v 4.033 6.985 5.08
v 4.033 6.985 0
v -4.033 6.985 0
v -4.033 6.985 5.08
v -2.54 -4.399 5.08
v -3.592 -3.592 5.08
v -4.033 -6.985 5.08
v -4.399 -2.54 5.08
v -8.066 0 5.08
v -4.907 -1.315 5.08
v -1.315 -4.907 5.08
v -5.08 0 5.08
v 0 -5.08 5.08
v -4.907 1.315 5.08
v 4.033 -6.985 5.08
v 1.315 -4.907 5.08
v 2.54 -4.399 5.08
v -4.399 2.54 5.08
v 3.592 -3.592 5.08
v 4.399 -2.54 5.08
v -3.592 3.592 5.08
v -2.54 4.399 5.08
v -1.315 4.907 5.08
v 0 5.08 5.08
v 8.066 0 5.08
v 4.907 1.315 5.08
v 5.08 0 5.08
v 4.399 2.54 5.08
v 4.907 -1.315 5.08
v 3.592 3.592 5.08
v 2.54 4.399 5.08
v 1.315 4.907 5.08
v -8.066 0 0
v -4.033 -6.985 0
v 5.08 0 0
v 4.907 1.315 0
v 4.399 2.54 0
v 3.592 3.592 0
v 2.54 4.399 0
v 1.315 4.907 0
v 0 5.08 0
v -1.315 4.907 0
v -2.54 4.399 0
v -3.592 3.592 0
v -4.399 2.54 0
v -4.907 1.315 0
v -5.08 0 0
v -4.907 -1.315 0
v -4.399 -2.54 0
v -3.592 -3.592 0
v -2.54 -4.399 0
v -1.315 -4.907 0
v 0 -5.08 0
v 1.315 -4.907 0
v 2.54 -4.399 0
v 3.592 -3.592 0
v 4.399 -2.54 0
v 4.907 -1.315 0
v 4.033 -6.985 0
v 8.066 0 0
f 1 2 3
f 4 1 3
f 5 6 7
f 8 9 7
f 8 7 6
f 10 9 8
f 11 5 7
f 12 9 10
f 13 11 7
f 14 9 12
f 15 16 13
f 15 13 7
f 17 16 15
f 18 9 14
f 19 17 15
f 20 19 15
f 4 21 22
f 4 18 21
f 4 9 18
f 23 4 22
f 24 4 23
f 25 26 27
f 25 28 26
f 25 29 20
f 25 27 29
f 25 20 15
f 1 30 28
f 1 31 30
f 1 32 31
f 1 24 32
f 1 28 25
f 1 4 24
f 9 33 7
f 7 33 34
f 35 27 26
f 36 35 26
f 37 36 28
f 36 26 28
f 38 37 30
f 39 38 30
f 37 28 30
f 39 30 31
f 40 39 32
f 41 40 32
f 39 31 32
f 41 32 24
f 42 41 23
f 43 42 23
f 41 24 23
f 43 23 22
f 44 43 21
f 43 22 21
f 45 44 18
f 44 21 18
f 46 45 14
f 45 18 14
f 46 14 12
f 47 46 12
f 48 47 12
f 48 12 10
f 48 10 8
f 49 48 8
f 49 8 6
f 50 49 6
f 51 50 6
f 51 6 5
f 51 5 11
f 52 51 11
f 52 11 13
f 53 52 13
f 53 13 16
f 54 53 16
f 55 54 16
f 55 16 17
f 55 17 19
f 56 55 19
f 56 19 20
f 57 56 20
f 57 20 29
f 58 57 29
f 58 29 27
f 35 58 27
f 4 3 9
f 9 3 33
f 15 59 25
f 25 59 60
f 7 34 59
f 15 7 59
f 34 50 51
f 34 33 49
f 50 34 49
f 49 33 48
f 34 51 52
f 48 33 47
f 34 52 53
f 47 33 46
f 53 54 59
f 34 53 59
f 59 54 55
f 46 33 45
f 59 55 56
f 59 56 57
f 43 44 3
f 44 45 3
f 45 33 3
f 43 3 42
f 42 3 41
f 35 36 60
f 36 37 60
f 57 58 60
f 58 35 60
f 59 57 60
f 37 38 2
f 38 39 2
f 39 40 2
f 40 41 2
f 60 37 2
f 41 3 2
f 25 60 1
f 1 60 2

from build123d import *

# Parameters (mm, degrees)
BOSS_EXTRUDE1_DEPTH = 5.08
CUT_EXTRUDE1_REACH  = 13.817
SKETCH2_R           = 5.08


with BuildPart() as part:
    # Sketch1 → Boss-Extrude1 (new body)
    with BuildSketch(Plane.XY):
        Polygon((8.065583261, 0), (4.03279163, 6.985), (-4.03279163, 6.985), (-8.065583261, 0), (-4.03279163, -6.985), (4.03279163, -6.985), align=None)
    extrude(amount=BOSS_EXTRUDE1_DEPTH)

    # Sketch2 → Cut-Extrude1 (cut, up to next)
    with BuildSketch(Plane.XY.offset(5.08), mode=Mode.PRIVATE) as cut_extrude1_sk1:
        Circle(SKETCH2_R)
    cut_extrude1_tool1 = extrude(cut_extrude1_sk1.sketch, amount=-CUT_EXTRUDE1_REACH, mode=Mode.PRIVATE) & part.part
    add(cut_extrude1_tool1.solids().sort_by_distance((0, 0, 5.08))[0], mode=Mode.SUBTRACT)


solid = part.part
